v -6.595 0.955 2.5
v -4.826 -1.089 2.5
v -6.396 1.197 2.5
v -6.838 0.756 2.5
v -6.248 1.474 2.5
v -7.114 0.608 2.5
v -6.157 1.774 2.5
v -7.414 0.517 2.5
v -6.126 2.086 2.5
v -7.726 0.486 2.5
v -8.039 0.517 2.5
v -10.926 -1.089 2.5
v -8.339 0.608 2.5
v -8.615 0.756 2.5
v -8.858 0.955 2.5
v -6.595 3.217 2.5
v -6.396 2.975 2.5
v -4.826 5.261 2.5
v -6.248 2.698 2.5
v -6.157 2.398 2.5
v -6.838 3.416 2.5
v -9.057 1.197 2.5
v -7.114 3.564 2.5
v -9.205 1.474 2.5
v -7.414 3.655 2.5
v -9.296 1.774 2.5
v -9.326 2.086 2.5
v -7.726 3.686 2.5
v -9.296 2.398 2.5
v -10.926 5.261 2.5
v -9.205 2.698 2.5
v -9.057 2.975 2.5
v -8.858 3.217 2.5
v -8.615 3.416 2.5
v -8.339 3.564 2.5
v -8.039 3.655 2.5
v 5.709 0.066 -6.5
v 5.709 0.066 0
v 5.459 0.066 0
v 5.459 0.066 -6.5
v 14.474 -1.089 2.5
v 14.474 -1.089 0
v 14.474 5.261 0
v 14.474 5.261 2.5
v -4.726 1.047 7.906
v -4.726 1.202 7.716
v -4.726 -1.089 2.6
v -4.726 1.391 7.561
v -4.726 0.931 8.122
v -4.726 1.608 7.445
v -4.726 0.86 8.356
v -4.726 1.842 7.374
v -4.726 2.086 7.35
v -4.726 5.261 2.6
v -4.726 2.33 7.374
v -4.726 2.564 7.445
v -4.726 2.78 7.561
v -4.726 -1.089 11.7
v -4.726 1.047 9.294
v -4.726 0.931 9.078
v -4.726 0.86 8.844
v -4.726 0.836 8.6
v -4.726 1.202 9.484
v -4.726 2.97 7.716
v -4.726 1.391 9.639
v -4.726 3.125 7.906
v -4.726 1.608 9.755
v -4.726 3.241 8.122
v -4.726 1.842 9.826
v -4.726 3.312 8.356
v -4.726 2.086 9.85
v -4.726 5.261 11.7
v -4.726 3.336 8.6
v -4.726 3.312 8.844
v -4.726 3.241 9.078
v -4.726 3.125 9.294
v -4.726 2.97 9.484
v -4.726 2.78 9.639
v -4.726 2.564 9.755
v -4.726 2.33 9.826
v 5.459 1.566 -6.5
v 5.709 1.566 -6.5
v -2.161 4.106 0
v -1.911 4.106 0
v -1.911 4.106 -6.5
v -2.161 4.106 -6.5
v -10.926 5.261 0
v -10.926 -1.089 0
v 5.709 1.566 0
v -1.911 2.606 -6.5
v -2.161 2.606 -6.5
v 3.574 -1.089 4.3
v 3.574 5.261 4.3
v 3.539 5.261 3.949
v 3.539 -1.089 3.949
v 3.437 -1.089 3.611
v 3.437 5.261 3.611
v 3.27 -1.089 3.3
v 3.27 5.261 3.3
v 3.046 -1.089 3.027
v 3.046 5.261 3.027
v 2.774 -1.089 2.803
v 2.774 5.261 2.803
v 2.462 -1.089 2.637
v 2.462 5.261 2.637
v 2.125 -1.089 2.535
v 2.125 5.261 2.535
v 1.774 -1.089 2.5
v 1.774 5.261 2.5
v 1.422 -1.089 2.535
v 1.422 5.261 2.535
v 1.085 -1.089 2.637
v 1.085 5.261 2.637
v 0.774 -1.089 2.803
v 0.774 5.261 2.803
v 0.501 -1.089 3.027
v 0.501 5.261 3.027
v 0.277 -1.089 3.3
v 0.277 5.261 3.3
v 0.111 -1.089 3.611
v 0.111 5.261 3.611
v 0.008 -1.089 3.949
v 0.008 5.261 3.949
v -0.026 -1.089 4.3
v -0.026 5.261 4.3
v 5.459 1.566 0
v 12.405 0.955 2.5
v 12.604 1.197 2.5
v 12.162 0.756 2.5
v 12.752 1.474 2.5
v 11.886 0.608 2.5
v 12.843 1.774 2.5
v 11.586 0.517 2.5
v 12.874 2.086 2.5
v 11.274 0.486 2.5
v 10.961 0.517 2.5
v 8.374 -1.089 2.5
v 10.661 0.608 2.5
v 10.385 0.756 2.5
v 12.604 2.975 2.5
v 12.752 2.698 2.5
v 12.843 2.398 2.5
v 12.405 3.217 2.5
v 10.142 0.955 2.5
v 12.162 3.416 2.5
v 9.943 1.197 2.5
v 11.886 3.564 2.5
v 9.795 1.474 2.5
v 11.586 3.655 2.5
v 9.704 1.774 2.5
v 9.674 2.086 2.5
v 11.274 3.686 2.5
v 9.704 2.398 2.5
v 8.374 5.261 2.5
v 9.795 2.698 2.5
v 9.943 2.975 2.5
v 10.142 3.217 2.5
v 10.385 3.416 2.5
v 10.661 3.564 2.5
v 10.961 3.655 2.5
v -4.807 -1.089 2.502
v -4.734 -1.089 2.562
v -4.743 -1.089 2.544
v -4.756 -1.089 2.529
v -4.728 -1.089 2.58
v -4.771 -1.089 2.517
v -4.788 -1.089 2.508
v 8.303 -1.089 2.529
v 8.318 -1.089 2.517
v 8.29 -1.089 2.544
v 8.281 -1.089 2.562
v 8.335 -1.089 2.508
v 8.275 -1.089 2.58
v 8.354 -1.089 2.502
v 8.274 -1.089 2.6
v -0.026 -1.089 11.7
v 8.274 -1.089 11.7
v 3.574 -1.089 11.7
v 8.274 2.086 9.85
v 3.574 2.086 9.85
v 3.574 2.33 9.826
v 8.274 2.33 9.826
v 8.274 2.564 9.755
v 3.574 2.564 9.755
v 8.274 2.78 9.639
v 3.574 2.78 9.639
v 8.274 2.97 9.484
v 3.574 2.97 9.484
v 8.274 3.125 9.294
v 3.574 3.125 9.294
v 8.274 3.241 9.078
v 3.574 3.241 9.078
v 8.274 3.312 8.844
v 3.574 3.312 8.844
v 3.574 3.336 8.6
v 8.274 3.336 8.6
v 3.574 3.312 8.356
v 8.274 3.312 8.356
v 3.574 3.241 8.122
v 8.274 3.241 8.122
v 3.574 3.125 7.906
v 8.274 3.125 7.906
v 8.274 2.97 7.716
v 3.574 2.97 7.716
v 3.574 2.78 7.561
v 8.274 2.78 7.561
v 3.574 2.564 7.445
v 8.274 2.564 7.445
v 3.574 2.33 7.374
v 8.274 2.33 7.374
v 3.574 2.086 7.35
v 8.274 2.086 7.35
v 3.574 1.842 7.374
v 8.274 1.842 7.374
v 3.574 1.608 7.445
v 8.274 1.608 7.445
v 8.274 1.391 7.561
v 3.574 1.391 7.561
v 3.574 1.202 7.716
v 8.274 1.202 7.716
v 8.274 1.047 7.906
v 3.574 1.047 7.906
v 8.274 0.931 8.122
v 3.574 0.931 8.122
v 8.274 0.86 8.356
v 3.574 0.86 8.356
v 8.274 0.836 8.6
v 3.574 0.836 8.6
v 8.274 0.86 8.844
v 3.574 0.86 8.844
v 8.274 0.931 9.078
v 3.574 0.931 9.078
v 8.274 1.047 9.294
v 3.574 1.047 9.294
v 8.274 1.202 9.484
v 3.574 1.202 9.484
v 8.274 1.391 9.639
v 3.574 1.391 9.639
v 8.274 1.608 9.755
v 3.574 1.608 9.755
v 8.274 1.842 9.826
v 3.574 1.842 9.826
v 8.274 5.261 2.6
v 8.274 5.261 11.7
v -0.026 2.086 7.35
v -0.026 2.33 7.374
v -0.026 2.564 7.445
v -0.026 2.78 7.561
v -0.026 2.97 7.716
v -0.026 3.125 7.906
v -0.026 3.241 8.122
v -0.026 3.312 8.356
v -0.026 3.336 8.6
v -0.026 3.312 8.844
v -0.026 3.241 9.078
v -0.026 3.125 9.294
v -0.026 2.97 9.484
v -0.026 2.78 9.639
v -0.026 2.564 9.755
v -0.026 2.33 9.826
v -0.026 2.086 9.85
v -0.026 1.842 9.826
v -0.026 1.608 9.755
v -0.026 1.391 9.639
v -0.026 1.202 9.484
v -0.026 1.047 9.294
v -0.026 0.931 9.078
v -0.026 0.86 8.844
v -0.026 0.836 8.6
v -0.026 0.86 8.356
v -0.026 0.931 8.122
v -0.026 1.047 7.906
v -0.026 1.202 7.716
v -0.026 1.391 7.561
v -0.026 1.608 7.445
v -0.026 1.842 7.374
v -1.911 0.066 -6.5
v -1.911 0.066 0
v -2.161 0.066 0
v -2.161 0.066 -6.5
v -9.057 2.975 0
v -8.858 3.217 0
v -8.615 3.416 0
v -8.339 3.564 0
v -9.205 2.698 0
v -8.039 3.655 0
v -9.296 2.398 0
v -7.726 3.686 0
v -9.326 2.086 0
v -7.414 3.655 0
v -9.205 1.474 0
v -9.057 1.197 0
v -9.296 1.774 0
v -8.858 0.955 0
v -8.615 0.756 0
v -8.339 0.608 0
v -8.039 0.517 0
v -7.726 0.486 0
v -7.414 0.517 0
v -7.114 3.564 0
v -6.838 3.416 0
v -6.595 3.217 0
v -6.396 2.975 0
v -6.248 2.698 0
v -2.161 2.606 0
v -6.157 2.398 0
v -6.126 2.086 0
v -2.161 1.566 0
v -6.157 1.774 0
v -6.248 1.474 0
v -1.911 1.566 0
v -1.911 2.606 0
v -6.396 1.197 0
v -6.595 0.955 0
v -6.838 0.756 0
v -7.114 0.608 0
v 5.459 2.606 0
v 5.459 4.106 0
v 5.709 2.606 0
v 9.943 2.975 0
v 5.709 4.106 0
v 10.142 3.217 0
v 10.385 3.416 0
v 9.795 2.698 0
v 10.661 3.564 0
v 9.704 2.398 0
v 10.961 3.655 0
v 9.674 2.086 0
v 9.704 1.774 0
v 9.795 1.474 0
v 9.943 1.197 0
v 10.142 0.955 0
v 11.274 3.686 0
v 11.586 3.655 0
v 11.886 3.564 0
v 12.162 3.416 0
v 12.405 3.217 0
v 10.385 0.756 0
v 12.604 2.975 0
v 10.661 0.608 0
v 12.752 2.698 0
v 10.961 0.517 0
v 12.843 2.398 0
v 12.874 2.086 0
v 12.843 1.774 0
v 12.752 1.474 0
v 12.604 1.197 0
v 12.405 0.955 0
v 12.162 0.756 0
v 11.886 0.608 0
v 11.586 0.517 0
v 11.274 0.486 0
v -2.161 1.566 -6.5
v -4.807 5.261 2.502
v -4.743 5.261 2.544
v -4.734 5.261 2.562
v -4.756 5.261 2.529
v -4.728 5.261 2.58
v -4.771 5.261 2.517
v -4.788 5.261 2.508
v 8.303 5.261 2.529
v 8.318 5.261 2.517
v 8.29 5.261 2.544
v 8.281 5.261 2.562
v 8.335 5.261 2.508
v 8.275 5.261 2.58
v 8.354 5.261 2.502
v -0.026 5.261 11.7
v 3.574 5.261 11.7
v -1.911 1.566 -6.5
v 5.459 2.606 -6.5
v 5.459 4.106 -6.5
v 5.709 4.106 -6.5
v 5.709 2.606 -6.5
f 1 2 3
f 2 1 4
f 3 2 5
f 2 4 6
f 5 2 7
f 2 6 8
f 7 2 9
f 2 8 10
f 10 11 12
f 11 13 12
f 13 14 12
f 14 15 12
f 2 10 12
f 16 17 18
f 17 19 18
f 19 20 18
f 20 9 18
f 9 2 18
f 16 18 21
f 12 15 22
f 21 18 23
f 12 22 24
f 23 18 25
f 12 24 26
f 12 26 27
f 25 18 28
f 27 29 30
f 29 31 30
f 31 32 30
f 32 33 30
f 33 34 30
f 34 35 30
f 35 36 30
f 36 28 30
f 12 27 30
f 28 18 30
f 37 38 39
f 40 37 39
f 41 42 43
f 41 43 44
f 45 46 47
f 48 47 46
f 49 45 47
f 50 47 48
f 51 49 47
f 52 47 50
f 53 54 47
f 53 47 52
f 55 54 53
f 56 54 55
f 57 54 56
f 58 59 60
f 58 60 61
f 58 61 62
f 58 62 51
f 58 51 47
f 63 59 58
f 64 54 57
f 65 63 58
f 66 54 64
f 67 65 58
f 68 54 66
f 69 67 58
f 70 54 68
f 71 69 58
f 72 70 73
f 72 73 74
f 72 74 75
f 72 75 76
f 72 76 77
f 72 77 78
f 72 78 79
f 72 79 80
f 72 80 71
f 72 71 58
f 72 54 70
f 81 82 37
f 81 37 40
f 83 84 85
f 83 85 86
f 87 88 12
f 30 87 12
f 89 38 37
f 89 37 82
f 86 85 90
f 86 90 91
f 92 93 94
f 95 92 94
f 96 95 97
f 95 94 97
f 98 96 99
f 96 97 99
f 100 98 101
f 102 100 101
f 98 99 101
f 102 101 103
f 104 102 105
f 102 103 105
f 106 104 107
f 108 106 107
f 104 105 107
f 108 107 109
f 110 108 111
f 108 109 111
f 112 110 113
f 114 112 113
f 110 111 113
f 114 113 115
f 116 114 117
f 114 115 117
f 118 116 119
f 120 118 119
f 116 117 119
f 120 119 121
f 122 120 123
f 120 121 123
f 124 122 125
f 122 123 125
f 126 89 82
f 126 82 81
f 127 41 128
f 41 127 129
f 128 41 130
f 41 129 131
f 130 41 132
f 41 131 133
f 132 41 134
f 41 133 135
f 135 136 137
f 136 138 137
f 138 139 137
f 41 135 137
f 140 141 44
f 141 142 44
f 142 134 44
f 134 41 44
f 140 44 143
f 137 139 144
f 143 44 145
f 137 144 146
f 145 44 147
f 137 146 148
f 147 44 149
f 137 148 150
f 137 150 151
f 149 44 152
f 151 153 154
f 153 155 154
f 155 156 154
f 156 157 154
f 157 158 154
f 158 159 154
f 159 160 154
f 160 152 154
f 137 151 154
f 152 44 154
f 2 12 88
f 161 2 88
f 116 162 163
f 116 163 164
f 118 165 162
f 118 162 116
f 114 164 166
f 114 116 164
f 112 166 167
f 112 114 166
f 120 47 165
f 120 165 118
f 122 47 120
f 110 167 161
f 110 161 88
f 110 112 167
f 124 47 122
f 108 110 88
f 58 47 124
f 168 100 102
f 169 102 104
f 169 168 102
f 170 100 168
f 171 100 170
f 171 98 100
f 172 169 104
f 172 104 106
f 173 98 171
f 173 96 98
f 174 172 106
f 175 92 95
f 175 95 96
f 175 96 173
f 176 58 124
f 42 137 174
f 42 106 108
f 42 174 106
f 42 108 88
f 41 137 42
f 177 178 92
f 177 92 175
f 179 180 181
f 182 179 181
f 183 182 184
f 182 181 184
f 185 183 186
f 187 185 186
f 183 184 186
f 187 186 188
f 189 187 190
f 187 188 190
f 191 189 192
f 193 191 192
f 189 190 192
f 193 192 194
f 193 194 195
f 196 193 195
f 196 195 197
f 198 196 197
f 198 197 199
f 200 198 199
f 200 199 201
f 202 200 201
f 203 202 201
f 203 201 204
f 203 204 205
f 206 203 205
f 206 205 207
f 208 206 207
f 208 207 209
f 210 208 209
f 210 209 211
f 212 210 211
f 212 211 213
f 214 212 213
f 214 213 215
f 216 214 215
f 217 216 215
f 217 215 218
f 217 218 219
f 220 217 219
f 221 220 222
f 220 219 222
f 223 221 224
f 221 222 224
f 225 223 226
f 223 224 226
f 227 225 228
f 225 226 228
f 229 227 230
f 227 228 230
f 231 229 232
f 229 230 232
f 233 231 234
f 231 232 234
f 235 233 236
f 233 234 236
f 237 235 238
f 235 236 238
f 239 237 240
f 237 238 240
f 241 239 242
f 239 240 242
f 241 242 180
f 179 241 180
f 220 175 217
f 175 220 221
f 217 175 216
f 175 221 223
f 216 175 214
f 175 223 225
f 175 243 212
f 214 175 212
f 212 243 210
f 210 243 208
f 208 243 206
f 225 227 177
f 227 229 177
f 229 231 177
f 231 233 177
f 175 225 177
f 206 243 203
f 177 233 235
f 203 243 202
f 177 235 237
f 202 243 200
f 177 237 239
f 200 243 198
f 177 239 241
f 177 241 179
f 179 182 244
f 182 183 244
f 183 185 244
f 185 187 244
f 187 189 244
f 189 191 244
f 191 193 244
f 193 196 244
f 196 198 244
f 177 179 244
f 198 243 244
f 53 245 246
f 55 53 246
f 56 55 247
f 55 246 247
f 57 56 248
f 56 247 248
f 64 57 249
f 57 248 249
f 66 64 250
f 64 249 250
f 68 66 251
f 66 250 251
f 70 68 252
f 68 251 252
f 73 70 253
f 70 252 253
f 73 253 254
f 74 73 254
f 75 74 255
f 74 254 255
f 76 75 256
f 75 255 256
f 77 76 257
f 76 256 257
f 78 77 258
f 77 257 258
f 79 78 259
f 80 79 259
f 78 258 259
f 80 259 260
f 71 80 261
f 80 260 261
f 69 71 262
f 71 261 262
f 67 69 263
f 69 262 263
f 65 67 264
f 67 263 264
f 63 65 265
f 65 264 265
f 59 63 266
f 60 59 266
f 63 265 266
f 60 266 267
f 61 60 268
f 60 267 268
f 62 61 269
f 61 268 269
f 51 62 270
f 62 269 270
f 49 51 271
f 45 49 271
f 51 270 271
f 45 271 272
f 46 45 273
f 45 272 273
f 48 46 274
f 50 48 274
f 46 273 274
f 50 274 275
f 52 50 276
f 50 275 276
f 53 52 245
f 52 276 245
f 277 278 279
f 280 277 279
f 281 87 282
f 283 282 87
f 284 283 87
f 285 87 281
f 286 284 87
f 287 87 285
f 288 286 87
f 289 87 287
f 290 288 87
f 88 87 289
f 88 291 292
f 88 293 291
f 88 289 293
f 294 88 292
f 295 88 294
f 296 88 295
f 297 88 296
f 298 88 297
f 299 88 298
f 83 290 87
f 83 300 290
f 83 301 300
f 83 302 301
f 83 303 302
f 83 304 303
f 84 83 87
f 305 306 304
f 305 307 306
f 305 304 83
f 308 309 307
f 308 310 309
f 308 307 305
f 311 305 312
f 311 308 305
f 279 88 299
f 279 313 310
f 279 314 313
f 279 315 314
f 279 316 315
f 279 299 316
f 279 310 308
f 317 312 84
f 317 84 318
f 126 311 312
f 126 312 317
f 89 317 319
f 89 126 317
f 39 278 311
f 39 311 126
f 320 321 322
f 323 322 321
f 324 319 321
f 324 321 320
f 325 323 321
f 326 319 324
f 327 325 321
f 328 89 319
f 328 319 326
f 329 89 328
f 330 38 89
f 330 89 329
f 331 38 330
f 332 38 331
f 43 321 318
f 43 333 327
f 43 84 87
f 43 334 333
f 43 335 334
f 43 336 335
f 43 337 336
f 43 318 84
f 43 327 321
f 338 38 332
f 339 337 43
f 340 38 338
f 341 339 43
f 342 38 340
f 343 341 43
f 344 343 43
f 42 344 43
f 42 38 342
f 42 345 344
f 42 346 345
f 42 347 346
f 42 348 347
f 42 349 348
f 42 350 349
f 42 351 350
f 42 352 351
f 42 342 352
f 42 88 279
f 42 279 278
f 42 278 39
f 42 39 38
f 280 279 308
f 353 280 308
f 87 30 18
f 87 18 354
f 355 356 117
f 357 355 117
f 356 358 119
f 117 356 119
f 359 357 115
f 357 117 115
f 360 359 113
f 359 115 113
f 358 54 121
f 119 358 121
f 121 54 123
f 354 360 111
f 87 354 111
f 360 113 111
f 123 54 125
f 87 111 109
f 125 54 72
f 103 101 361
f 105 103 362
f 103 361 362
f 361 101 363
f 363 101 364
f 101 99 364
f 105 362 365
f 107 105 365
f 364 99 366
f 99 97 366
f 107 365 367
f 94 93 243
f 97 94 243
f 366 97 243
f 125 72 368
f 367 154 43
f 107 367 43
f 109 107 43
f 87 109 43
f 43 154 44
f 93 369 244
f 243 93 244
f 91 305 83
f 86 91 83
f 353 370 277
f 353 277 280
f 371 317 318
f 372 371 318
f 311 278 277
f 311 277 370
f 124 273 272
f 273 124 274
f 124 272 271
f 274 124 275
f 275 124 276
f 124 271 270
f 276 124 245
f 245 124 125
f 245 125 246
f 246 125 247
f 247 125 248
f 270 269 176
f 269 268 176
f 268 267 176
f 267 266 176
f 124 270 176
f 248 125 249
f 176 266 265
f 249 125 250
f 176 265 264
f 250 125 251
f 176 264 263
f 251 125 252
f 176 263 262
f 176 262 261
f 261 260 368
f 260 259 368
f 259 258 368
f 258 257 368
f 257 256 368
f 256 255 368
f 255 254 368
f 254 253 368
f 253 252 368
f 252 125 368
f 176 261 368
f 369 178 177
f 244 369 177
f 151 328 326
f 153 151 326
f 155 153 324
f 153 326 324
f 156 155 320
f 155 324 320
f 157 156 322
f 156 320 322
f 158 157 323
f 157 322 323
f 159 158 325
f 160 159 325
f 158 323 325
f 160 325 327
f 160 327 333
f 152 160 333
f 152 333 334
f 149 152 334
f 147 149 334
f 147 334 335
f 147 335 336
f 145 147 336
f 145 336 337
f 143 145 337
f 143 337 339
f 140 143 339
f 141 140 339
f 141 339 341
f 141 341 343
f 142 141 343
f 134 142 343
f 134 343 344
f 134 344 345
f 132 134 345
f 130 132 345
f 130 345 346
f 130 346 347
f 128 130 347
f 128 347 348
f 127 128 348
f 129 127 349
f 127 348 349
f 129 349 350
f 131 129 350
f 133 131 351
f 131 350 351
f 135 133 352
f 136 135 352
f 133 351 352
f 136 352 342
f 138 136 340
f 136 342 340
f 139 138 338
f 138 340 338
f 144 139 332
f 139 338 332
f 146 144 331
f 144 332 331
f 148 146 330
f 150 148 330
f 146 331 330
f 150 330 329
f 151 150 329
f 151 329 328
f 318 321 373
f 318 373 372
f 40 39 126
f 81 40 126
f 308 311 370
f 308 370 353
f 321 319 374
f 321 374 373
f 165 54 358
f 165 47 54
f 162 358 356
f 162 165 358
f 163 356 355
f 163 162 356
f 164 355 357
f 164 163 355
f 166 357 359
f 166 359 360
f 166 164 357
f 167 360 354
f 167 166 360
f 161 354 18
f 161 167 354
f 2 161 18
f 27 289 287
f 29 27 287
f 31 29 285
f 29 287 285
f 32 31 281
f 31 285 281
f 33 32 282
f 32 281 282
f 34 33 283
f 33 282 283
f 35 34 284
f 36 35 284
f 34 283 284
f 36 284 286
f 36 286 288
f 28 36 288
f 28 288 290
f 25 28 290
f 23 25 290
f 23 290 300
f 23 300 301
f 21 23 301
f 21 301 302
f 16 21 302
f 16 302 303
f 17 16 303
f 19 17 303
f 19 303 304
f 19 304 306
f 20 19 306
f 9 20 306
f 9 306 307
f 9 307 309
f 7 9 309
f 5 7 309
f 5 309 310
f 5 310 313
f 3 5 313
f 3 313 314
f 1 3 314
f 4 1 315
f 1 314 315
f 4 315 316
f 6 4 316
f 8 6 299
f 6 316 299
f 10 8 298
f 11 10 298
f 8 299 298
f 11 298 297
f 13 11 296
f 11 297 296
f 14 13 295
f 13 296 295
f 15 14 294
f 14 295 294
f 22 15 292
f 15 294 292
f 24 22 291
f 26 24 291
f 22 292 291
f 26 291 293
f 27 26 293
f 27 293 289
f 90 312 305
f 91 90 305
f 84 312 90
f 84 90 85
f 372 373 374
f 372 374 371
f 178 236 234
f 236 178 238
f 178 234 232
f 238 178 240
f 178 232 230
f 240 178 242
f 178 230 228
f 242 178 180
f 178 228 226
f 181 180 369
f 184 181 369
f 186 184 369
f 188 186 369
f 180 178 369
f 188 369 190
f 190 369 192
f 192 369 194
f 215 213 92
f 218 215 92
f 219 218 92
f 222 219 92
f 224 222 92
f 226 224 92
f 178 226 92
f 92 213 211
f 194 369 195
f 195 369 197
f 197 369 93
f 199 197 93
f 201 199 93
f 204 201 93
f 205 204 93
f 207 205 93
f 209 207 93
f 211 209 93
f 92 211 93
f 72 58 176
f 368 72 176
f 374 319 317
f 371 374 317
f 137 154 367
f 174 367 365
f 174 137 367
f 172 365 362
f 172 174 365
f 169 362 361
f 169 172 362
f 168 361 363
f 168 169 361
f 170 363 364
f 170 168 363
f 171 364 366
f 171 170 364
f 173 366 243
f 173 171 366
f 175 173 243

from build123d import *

# Parameters (mm, degrees)
SKETCH1_W           = 25.4
SKETCH1_H           = 11.7
BOSS_EXTRUDE1_DEPTH = 6.35
SKETCH2_W           = 6.2
SKETCH2_H           = 9.2
CUT_EXTRUDE1_DEPTH  = 20.664581181
CUT_EXTRUDE2_DEPTH  = 20.664581181
SKETCH4_W           = 6.2
SKETCH4_H           = 9.2
CUT_EXTRUDE3_DEPTH  = 20.664581181
SKETCH5_W           = 0.25
SKETCH5_H           = 1.5
BOSS_EXTRUDE2_DEPTH = 6.5
SKETCH6_W           = 0.25
SKETCH6_H           = 1.5
BOSS_EXTRUDE3_DEPTH = 6.5
SKETCH7_W           = 0.25
SKETCH7_H           = 1.5
BOSS_EXTRUDE4_DEPTH = 6.5
SKETCH8_W           = 0.25
SKETCH8_H           = 1.5
BOSS_EXTRUDE5_DEPTH = 6.5
HOLE1_D             = 3.2
HOLE1_DEPTH         = 9
HOLE2_D             = 3.2
HOLE2_DEPTH         = 9
HOLE3_D             = 2.5
HOLE3_DEPTH         = 4.7
HOLE4_D             = 2.5
HOLE4_DEPTH         = 19.2
FILLET1_R           = 0.1
FILLET2_R           = 0.1


with BuildPart() as part:
    # Sketch1 → Boss-Extrude1 (new body)
    with BuildSketch(Plane.XZ.offset(1.08911007)):
        with Locations((1.7735363, 5.85)):
            Rectangle(SKETCH1_W, SKETCH1_H)
    extrude(amount=-BOSS_EXTRUDE1_DEPTH)

    # Sketch2 → Cut-Extrude1 (cut, through all)
    with BuildSketch(Plane(origin=(0, 5.26088993, 0), x_dir=(-1, 0, 0), z_dir=(0, 1, 0))):
        with Locations((-11.3735363, 7.1)):
            Rectangle(SKETCH2_W, SKETCH2_H)
    extrude(amount=-CUT_EXTRUDE1_DEPTH, mode=Mode.SUBTRACT)

    # Sketch3 → Cut-Extrude2 (cut, through all)
    with BuildSketch(Plane(origin=(0, 5.26088993, 0), x_dir=(-1, 0, 0), z_dir=(0, 1, 0))):
        with BuildLine():
            Line((-3.5735363, 11.7), (-3.5735363, 4.3))
            ThreePointArc((-3.5735363, 4.3), (-1.7735363, 2.5), (0.0264637, 4.3))
            Line((0.0264637, 4.3), (0.0264637, 11.7))
            Line((0.0264637, 11.7), (-3.5735363, 11.7))
        make_face()
    extrude(amount=-CUT_EXTRUDE2_DEPTH, mode=Mode.SUBTRACT)

    # Sketch4 → Cut-Extrude3 (cut, through all)
    with BuildSketch(Plane(origin=(0, 5.26088993, 0), x_dir=(-1, 0, 0), z_dir=(0, 1, 0))):
        with Locations((7.8264637, 7.1)):
            Rectangle(SKETCH4_W, SKETCH4_H)
    extrude(amount=-CUT_EXTRUDE3_DEPTH, mode=Mode.SUBTRACT)

    # Sketch5 → Boss-Extrude2 (add)
    with BuildSketch(Plane(origin=(0, 0, 0), x_dir=(-1, 0, 0), z_dir=(0, 0, -1))):
        with Locations((2.0364637, 0.81588993)):
            Rectangle(SKETCH5_W, SKETCH5_H)
    extrude(amount=BOSS_EXTRUDE2_DEPTH)

    # Sketch6 → Boss-Extrude3 (add)
    with BuildSketch(Plane(origin=(0, 0, 0), x_dir=(-1, 0, 0), z_dir=(0, 0, -1))):
        with Locations((2.0364637, 3.35588993)):
            Rectangle(SKETCH6_W, SKETCH6_H)
    extrude(amount=BOSS_EXTRUDE3_DEPTH)

    # Sketch7 → Boss-Extrude4 (add)
    with BuildSketch(Plane(origin=(0, 0, 0), x_dir=(-1, 0, 0), z_dir=(0, 0, -1))):
        with Locations((-5.5835363, 3.35588993)):
            Rectangle(SKETCH7_W, SKETCH7_H)
    extrude(amount=BOSS_EXTRUDE4_DEPTH)

    # Sketch8 → Boss-Extrude5 (add)
    with BuildSketch(Plane(origin=(0, 0, 0), x_dir=(-1, 0, 0), z_dir=(0, 0, -1))):
        with Locations((-5.5835363, 0.81588993)):
            Rectangle(SKETCH8_W, SKETCH8_H)
    extrude(amount=BOSS_EXTRUDE5_DEPTH)

    # Hole1
    with Locations(Plane.XY.offset(2.5)):
        with Locations((11.2735363, 2.08588993)):
            Hole(HOLE1_D / 2, depth=HOLE1_DEPTH)

    # Hole2
    with Locations(Plane.XY.offset(2.5)):
        with Locations((-7.7264637, 2.08588993)):
            Hole(HOLE2_D / 2, depth=HOLE2_DEPTH)

    # Hole3
    with Locations(Plane.ZY.offset(4.7264637)):
        with Locations((8.6, 2.08588993)):
            Hole(HOLE3_D / 2, depth=HOLE3_DEPTH)

    # Hole4
    with Locations(Plane(origin=(8.2735363, 0, 0), x_dir=(0, 0, -1), z_dir=(1, 0, 0))):
        with Locations((-8.6, 2.08588993)):
            Hole(HOLE4_D / 2, depth=HOLE4_DEPTH)

    # Fillet1
    fillet1_edges = [part.edges().sort_by_distance(p)[0] for p in [
        (-4.7264637, 2.08588993, 2.5),
    ]]
    fillet(fillet1_edges, radius=FILLET1_R)

    # Fillet2
    fillet2_edges = [part.edges().sort_by_distance(p)[0] for p in [
        (8.2735363, 2.08588993, 2.5),
    ]]
    fillet(fillet2_edges, radius=FILLET2_R)


solid = part.part
